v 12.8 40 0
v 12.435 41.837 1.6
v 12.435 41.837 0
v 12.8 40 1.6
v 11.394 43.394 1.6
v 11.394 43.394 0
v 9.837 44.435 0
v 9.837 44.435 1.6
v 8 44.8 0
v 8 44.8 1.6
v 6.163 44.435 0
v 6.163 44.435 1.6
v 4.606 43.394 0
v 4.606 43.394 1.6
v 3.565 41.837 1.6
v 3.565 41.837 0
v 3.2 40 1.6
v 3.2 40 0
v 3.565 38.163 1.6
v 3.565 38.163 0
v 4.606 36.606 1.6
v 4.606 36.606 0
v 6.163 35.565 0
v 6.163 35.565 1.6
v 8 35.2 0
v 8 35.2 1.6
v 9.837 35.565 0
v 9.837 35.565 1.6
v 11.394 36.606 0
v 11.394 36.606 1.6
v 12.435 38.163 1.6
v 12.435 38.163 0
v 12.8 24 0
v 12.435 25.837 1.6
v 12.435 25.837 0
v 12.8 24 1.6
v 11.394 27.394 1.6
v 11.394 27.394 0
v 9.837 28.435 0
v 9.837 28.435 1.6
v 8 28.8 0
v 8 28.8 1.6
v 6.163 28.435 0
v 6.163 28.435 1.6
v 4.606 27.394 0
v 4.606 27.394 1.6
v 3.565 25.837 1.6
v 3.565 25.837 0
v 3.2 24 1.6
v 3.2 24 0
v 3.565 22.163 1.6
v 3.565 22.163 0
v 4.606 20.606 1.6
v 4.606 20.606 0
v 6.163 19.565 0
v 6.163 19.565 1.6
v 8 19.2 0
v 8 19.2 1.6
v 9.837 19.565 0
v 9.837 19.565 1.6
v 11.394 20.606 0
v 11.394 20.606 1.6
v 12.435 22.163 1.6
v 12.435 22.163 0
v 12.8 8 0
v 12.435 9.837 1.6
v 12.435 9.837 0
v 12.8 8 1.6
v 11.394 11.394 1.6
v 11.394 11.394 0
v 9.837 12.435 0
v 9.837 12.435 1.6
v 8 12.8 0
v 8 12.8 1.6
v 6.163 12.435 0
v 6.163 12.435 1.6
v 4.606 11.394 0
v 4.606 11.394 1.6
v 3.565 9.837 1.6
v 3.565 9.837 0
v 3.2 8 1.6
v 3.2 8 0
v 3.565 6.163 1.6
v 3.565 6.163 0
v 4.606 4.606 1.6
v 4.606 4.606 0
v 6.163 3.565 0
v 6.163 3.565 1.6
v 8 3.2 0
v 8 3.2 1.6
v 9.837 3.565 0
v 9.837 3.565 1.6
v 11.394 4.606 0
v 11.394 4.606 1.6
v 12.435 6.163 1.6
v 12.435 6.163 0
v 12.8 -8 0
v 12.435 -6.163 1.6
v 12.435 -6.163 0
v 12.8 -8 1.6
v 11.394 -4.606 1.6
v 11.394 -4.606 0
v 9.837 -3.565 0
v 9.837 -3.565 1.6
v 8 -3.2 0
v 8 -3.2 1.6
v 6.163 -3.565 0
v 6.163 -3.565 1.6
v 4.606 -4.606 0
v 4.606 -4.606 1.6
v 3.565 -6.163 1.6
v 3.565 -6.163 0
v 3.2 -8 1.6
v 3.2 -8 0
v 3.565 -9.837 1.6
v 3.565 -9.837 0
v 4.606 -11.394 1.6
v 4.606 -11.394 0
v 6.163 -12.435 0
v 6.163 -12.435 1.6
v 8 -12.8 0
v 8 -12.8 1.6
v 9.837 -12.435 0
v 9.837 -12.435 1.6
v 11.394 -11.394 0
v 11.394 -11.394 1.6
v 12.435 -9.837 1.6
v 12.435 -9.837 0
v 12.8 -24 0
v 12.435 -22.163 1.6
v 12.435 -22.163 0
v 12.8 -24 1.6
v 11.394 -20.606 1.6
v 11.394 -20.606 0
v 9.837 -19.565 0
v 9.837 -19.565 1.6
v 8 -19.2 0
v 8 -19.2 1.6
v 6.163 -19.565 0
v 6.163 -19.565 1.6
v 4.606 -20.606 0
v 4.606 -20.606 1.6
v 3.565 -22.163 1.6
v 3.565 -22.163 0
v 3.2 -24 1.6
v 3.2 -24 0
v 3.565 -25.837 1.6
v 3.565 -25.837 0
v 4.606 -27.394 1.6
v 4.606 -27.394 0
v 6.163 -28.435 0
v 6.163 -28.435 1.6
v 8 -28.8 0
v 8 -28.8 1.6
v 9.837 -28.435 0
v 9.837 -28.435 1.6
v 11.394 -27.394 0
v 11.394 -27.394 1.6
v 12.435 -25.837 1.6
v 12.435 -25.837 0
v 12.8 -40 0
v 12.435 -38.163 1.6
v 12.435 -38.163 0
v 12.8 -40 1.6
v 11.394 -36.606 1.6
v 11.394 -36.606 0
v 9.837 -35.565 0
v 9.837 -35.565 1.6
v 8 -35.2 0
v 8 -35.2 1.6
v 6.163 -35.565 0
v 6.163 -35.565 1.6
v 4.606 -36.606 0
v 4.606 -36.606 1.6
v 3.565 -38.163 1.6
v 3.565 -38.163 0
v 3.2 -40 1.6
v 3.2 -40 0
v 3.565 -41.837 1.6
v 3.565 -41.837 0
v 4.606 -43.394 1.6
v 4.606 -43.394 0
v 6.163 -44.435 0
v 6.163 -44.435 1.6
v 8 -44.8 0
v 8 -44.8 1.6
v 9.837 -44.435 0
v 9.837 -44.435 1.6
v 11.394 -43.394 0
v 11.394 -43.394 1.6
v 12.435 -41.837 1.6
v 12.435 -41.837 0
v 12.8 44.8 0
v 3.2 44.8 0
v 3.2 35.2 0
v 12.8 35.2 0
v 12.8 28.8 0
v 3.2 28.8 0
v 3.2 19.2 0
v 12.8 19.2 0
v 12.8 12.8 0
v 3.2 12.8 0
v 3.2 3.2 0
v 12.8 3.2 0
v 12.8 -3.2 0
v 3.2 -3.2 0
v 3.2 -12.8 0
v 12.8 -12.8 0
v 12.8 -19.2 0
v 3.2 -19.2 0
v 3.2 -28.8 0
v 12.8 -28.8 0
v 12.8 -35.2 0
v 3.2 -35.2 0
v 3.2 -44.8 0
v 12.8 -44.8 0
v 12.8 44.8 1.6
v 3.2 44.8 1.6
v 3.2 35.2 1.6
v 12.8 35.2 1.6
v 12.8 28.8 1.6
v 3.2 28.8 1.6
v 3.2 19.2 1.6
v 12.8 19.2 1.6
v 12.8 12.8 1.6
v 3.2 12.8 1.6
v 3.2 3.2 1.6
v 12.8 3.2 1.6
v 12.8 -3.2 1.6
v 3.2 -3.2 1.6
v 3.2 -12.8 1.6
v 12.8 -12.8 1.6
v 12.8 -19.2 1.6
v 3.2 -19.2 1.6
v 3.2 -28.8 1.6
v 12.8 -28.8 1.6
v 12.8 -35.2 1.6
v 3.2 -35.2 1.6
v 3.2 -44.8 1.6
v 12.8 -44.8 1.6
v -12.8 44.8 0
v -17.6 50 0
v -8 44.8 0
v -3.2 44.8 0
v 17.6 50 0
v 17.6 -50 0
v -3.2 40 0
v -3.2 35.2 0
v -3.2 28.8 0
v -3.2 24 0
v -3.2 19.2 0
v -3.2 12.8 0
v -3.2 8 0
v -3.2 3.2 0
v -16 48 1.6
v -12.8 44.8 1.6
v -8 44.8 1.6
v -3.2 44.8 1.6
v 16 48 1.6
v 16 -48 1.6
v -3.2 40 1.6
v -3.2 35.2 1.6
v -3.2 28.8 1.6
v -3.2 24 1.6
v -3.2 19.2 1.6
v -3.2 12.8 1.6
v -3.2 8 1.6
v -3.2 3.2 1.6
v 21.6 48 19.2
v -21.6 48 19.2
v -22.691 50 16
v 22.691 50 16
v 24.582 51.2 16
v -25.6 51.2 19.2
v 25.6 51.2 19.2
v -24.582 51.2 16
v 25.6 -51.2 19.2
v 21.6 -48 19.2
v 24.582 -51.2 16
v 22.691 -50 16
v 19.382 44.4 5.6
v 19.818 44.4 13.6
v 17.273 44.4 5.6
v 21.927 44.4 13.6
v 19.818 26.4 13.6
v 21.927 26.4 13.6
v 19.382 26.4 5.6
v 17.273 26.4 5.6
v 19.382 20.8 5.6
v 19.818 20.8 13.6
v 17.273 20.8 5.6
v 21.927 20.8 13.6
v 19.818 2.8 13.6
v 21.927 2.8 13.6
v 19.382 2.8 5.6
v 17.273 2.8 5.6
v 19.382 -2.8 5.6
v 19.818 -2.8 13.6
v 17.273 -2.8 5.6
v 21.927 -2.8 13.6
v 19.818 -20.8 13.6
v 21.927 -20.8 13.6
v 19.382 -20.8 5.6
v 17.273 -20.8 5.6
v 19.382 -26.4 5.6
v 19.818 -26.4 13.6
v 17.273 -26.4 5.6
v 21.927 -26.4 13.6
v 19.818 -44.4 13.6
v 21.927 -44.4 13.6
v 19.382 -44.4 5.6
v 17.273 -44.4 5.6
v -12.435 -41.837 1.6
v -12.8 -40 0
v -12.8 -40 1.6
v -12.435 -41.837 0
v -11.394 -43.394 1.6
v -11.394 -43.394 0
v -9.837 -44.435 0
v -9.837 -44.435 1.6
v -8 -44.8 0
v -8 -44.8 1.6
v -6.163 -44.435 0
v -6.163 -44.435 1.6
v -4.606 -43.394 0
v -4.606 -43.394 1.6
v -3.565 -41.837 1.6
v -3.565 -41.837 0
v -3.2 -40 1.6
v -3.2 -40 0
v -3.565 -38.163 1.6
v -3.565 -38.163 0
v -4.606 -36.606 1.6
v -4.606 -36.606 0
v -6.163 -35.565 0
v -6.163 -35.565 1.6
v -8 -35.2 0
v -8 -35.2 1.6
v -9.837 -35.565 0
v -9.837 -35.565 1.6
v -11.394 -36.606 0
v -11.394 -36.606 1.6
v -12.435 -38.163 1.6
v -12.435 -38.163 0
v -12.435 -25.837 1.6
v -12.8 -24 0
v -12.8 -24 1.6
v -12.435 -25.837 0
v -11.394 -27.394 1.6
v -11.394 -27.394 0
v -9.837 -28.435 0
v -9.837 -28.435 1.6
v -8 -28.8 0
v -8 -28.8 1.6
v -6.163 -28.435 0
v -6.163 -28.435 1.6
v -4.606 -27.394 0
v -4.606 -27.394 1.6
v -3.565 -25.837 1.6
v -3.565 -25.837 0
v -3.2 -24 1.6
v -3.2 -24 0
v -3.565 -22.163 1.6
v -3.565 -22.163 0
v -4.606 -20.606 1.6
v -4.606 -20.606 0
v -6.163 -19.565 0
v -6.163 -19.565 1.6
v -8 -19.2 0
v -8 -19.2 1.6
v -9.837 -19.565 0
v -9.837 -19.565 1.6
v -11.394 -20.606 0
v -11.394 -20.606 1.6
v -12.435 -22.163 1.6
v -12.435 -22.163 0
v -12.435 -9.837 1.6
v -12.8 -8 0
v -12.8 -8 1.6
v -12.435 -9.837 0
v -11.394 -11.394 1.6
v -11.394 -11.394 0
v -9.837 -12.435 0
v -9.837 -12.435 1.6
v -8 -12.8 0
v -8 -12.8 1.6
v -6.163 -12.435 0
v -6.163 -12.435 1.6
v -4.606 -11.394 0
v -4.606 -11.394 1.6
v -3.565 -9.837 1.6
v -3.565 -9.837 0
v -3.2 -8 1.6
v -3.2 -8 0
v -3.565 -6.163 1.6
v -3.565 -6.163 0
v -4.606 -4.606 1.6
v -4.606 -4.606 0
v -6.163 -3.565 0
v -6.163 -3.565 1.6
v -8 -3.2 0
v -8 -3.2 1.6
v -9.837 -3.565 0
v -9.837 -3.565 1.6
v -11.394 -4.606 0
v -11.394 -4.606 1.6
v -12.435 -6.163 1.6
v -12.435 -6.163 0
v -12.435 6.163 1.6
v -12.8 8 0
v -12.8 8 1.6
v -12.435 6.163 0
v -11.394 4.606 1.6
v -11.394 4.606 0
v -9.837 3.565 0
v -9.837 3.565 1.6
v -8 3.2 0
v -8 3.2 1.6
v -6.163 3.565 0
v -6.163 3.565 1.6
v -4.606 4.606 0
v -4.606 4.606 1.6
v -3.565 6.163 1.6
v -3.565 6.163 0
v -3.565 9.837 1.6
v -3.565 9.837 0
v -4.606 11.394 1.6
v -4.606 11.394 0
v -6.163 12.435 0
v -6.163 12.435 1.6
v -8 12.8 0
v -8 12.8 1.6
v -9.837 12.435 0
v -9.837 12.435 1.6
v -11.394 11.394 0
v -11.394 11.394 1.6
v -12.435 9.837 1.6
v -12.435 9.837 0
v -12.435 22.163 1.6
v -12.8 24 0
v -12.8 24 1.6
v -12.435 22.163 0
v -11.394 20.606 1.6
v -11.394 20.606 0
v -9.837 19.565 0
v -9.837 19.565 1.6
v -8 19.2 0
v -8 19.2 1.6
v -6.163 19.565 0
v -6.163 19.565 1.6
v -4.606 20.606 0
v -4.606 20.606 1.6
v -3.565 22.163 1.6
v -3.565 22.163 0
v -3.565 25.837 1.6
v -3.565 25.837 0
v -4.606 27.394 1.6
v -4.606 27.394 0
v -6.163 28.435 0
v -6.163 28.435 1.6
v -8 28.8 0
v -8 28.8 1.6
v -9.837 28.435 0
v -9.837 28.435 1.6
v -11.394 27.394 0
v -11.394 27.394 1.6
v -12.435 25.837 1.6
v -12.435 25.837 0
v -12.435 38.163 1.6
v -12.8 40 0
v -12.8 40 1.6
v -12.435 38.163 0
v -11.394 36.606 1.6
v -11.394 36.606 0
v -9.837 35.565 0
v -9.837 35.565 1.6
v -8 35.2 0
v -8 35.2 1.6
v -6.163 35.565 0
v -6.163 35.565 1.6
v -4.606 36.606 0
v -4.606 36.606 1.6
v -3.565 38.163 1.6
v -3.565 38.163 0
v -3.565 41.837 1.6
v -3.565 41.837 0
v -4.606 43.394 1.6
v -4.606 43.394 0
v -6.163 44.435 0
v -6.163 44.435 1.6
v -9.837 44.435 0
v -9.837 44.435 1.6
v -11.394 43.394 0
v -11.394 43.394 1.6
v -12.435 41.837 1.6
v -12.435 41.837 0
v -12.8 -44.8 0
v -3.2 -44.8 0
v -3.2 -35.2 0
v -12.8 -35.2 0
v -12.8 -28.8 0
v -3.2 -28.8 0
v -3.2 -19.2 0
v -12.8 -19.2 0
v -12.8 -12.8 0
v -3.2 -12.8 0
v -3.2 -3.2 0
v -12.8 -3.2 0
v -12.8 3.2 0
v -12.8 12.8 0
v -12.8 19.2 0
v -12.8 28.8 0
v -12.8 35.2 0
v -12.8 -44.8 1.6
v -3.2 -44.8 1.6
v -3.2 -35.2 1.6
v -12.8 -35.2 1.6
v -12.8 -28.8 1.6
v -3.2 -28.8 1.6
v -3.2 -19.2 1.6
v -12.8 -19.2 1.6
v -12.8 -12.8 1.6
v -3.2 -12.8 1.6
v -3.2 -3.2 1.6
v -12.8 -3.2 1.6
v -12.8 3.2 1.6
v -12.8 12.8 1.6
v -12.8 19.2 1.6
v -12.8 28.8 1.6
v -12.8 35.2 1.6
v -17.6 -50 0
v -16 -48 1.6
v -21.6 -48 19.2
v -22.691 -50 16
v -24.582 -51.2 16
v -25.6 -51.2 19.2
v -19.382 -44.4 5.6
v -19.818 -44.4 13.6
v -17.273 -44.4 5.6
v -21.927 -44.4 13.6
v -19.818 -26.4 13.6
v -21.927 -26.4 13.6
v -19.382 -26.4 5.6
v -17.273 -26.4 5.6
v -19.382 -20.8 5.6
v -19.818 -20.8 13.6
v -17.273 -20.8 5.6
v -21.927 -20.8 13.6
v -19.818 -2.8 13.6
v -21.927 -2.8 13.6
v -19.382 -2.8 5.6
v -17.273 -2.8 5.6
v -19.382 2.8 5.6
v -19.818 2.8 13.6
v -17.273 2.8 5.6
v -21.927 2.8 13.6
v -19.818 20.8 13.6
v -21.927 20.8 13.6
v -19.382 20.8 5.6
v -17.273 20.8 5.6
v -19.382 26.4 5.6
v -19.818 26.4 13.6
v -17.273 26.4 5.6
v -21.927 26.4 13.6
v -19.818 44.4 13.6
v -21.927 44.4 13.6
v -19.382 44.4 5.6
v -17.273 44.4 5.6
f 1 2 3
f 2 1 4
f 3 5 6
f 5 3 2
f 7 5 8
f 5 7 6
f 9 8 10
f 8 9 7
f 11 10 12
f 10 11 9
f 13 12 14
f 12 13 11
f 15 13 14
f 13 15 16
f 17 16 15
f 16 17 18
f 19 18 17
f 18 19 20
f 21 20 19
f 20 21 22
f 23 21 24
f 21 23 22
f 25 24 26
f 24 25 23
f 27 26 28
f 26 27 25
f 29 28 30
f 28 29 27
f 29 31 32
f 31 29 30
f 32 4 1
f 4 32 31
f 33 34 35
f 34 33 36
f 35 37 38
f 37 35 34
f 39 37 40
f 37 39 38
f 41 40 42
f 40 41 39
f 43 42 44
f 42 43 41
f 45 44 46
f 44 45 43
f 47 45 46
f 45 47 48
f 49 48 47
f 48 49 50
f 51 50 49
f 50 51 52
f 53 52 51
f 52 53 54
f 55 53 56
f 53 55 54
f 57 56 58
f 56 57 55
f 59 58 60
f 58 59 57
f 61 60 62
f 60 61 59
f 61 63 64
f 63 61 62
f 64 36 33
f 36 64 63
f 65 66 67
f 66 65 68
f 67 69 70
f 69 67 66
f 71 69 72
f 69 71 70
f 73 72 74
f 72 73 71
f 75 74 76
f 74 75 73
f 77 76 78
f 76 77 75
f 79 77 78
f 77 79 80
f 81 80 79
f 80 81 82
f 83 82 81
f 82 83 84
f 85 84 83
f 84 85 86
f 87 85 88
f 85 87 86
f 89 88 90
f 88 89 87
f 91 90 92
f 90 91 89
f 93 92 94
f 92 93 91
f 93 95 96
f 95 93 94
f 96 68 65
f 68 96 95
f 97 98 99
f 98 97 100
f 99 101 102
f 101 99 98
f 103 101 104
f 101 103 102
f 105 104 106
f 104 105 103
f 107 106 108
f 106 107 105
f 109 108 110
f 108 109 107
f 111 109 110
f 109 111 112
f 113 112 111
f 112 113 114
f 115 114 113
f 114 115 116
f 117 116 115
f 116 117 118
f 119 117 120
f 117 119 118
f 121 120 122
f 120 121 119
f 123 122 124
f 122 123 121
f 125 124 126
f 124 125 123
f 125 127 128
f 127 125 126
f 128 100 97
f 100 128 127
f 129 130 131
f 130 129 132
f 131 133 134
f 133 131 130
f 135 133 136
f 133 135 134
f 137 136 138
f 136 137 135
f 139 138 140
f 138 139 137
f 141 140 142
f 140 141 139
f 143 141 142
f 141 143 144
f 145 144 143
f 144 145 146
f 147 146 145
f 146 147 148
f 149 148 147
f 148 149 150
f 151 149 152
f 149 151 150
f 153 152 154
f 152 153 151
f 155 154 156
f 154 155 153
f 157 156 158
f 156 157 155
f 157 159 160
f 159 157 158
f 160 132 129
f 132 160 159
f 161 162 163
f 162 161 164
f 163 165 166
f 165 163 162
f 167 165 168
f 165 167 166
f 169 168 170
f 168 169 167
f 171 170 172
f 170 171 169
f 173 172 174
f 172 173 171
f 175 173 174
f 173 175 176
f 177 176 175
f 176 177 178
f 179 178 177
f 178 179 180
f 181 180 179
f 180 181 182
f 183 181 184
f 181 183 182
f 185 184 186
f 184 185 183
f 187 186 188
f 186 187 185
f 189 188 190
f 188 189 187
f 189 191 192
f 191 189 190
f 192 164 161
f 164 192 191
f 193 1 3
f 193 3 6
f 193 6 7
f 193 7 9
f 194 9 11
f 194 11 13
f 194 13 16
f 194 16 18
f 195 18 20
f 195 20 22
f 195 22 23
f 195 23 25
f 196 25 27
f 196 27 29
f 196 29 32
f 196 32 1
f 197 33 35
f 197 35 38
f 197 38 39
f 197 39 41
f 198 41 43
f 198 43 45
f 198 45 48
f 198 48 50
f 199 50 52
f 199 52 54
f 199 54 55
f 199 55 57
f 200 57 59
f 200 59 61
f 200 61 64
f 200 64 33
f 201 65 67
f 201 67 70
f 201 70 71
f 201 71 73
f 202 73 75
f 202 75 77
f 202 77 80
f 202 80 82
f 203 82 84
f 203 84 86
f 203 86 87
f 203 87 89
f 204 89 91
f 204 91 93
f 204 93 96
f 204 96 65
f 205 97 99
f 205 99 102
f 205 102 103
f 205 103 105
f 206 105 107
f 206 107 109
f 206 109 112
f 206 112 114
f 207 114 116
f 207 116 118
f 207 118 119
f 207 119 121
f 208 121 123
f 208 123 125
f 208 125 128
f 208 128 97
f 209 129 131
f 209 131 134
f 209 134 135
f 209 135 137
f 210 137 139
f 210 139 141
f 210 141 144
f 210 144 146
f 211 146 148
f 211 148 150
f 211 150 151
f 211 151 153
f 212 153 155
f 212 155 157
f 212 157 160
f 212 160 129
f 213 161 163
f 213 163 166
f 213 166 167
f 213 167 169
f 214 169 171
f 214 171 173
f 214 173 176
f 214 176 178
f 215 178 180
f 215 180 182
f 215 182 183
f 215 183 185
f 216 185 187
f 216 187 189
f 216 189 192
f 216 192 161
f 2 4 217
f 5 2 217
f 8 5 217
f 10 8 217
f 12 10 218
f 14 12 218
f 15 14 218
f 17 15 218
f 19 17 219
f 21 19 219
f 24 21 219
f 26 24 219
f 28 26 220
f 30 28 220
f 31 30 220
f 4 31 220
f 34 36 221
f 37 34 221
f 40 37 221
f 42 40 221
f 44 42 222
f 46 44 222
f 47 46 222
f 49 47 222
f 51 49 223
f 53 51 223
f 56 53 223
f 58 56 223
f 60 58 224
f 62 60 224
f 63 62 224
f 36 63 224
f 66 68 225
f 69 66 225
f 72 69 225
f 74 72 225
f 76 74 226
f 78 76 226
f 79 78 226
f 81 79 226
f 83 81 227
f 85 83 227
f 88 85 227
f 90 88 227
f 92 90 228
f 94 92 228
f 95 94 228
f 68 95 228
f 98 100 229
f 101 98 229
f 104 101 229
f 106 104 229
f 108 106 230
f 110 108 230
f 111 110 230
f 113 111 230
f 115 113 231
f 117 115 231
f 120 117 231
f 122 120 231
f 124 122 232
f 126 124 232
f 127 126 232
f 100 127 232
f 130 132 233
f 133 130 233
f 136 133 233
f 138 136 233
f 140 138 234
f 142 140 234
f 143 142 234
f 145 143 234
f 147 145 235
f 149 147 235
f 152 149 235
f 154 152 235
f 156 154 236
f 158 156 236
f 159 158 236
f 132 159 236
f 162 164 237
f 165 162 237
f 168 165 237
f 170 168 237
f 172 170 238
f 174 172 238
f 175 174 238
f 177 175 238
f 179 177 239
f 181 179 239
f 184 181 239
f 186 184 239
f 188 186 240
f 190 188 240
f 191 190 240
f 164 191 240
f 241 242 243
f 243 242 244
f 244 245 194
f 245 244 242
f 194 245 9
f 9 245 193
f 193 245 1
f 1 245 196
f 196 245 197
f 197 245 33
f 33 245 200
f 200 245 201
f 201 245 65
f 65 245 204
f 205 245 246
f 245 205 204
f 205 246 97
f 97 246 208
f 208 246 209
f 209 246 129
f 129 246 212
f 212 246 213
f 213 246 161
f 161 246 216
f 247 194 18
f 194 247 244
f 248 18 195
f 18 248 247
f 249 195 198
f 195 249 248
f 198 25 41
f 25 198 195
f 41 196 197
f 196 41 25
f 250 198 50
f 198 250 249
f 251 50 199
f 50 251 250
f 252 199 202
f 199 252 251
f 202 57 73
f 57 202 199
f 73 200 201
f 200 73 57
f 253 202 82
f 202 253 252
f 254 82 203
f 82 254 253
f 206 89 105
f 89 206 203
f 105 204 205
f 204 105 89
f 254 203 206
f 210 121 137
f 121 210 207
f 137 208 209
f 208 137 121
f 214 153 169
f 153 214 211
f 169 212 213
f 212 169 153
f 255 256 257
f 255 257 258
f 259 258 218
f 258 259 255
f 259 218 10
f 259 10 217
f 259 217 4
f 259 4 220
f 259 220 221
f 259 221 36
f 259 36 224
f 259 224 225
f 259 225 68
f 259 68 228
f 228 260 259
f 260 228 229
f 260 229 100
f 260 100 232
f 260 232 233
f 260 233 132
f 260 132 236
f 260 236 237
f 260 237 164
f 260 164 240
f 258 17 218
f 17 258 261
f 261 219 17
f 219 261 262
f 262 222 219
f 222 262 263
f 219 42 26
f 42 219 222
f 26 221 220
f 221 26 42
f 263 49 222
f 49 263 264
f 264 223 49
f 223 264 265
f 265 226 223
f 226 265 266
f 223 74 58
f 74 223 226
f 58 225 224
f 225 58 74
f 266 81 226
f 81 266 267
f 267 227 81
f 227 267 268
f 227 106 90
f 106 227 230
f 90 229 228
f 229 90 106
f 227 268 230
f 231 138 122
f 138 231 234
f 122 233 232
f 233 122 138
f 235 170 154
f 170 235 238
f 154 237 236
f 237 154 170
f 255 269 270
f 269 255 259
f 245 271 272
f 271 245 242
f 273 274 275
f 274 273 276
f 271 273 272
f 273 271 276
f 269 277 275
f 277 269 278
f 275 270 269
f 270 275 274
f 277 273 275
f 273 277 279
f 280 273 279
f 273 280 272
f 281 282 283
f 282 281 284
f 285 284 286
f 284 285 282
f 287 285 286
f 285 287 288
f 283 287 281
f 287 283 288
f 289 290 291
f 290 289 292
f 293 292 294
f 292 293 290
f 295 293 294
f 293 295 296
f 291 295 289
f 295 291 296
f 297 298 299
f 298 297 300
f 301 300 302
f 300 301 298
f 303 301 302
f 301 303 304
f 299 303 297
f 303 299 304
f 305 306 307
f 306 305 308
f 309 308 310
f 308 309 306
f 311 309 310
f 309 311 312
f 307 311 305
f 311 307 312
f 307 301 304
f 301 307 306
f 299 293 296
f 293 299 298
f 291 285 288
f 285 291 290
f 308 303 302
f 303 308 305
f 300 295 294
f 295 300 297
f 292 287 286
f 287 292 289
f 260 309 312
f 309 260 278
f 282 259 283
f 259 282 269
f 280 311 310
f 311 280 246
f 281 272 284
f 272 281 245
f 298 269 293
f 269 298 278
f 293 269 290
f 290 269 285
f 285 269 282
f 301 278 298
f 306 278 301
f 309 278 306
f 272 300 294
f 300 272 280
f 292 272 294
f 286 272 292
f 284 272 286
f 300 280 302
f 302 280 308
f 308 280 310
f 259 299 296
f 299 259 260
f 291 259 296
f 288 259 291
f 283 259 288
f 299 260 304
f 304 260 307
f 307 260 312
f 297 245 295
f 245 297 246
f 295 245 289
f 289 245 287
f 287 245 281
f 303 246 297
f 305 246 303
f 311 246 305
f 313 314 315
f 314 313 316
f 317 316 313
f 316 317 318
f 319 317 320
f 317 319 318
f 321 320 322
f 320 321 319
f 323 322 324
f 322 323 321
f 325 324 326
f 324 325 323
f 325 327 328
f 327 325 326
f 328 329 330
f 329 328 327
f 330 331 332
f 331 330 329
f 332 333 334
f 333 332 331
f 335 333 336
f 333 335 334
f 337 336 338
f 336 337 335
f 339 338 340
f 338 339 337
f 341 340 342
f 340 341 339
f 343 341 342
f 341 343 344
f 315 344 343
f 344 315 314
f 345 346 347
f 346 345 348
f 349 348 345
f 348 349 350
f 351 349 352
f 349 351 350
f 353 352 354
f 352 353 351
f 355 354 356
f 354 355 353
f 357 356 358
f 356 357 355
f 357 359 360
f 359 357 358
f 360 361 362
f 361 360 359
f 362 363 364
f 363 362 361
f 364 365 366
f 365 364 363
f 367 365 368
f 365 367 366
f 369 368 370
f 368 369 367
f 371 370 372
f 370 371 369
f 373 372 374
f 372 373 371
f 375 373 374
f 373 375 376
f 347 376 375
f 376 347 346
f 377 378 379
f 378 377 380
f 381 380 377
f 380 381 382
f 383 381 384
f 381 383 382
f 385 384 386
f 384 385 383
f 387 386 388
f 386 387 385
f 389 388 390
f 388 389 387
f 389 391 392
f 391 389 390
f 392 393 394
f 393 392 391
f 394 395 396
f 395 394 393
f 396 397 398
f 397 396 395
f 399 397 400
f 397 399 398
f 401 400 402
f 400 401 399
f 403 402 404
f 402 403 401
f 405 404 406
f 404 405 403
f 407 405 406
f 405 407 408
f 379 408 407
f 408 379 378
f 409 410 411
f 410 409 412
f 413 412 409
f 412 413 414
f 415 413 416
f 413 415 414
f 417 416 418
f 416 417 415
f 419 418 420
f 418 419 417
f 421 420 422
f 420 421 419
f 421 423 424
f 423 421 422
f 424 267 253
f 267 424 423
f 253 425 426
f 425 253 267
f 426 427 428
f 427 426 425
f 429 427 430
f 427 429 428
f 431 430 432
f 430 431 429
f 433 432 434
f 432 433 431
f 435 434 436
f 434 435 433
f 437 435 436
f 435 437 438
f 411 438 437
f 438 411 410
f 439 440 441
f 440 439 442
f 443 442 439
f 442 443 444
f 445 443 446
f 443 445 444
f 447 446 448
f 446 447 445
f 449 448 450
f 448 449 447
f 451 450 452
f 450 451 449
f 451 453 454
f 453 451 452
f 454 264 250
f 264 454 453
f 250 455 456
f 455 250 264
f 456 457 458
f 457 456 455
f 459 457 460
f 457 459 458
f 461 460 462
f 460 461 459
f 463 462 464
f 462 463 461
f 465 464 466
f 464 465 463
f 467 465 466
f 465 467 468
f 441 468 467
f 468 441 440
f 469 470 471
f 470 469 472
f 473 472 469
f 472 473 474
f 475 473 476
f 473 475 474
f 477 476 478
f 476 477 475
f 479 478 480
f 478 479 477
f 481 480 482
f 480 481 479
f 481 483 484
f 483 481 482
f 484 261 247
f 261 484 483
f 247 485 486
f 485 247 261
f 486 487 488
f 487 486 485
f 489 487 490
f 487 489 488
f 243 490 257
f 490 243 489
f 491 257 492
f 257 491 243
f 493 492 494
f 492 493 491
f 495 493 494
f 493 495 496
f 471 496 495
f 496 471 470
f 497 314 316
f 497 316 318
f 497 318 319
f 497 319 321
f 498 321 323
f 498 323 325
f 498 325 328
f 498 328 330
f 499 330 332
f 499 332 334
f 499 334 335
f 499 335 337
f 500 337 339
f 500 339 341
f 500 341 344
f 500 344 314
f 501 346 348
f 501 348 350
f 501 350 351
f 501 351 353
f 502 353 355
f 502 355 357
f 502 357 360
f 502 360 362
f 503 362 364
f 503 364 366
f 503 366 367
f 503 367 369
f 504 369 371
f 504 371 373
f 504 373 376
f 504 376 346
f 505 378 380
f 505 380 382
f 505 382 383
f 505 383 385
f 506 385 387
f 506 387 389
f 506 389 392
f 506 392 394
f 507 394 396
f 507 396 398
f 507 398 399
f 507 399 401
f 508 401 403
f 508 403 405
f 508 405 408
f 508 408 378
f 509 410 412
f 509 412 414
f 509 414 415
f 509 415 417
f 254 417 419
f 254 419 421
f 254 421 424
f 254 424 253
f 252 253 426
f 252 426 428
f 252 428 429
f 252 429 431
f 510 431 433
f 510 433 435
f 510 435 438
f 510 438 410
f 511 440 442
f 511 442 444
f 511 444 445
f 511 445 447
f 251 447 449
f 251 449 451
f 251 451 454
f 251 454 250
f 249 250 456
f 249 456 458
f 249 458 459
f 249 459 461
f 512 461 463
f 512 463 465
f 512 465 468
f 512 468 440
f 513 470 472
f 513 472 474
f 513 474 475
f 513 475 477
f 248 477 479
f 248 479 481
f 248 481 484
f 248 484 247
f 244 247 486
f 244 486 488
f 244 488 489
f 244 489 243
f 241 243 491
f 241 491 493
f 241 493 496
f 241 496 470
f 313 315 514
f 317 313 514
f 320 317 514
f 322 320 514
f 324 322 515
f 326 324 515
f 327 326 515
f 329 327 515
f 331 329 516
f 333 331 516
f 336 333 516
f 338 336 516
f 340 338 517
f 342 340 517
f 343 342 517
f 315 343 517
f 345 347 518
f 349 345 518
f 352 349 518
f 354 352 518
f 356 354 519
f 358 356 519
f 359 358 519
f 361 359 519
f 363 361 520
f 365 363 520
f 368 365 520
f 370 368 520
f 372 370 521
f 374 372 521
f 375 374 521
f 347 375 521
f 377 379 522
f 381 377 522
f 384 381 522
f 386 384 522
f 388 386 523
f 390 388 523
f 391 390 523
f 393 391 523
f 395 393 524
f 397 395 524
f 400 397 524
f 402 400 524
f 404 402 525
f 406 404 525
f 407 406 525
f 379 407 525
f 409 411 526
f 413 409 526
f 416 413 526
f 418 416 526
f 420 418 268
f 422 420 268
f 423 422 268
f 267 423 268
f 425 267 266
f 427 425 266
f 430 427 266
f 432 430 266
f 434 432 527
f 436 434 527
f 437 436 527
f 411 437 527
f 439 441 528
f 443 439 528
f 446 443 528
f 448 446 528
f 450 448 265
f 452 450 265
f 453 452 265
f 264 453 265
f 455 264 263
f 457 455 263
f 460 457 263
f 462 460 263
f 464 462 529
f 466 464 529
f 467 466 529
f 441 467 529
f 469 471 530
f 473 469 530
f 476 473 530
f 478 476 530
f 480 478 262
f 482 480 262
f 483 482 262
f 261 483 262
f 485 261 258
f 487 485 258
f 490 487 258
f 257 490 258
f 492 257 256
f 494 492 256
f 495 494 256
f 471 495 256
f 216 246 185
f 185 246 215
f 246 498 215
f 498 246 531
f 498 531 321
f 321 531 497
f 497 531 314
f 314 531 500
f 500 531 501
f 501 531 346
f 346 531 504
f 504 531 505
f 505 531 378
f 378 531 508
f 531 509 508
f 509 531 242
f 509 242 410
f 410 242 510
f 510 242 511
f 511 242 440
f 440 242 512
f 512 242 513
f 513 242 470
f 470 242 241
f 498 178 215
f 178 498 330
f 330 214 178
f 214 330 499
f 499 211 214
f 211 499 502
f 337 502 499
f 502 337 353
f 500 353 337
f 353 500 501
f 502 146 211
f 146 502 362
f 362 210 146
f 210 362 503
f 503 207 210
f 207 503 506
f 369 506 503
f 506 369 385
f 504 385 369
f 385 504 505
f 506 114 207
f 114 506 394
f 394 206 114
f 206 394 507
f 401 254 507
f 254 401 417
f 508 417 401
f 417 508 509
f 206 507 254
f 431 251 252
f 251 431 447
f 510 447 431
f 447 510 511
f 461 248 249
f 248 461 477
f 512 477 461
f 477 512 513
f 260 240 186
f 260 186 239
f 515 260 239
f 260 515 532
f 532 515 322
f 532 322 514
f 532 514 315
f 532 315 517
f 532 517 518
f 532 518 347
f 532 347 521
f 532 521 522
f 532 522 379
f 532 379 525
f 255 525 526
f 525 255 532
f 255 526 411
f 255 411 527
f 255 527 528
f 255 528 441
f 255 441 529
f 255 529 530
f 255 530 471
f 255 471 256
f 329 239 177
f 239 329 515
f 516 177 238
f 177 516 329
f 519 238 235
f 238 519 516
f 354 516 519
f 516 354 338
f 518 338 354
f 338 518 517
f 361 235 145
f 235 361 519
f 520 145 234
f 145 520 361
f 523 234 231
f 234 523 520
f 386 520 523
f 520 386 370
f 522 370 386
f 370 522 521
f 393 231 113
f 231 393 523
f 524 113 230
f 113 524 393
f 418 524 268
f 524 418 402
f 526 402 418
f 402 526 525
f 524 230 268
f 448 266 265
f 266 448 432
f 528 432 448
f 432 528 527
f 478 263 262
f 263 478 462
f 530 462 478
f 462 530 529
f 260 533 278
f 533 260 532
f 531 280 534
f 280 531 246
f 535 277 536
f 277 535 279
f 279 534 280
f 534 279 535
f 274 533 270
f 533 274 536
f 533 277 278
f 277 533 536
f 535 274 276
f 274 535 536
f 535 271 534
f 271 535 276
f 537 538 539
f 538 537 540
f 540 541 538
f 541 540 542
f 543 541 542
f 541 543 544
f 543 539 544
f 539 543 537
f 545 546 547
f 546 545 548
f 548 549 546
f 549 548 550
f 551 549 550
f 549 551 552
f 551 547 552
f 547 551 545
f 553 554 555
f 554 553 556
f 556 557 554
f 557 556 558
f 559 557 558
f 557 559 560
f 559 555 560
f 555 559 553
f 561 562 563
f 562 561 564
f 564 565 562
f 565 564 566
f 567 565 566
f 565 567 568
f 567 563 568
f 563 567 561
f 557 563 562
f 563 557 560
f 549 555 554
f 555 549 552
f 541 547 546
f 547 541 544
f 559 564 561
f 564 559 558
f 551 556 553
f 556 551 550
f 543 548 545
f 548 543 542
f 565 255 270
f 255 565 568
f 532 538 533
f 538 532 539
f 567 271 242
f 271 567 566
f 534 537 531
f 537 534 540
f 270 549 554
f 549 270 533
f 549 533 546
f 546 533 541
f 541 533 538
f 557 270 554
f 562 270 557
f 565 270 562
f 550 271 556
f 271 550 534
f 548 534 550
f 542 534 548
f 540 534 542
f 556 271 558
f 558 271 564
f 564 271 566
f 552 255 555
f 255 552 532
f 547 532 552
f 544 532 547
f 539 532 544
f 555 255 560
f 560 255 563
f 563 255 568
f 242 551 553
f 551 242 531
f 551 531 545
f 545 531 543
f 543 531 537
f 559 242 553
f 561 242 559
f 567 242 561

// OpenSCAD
// file: ../p/4-4edge.scad
use <../lib.scad>
function ldraw_lib__4_4edge() = [
// 0 Circle 1.0
// 0 Name: 4-4edge.dat
// 0 Author: James Jessiman
// 0 !LDRAW_ORG Primitive UPDATE 2017-01
// 0 !LICENSE Licensed under CC BY 4.0 : see CAreadme.txt
// 
// 0 BFC CERTIFY CCW
  [0,"BFC","CERTIFY"],
  [0,"BFC","CCW"],
// 
// 0 !HISTORY 1998-12-15 [PTadmin] Official Update 1998-10
// 0 !HISTORY 2005-12-28 [PTadmin] Official Update 2005-01
// 0 !HISTORY 2007-06-24 [PTadmin] Header formatted for Contributor Agreement
// 0 !HISTORY 2008-07-01 [PTadmin] Official Update 2008-01
// 0 !HISTORY 2017-01-15 [Steffen] BFCed
// 0 !HISTORY 2017-12-30 [PTadmin] Official Update 2017-01
// 
// 
// 2 24 1 0 0 0.9239 0 0.3827
  [2,24,1,0,0,0.9239,0,0.3827],
// 2 24 0.9239 0 0.3827 0.7071 0 0.7071
  [2,24,0.9239,0,0.3827,0.7071,0,0.7071],
// 2 24 0.7071 0 0.7071 0.3827 0 0.9239
  [2,24,0.7071,0,0.7071,0.3827,0,0.9239],
// 2 24 0.3827 0 0.9239 0 0 1
  [2,24,0.3827,0,0.9239,0,0,1],
// 2 24 0 0 1 -0.3827 0 0.9239
  [2,24,0,0,1,-0.3827,0,0.9239],
// 2 24 -0.3827 0 0.9239 -0.7071 0 0.7071
  [2,24,-0.3827,0,0.9239,-0.7071,0,0.7071],
// 2 24 -0.7071 0 0.7071 -0.9239 0 0.3827
  [2,24,-0.7071,0,0.7071,-0.9239,0,0.3827],
// 2 24 -0.9239 0 0.3827 -1 0 -0
  [2,24,-0.9239,0,0.3827,-1,0,-0],
// 2 24 -1 0 -0 -0.9239 0 -0.3827
  [2,24,-1,0,-0,-0.9239,0,-0.3827],
// 2 24 -0.9239 0 -0.3827 -0.7071 0 -0.7071
  [2,24,-0.9239,0,-0.3827,-0.7071,0,-0.7071],
// 2 24 -0.7071 0 -0.7071 -0.3827 0 -0.9239
  [2,24,-0.7071,0,-0.7071,-0.3827,0,-0.9239],
// 2 24 -0.3827 0 -0.9239 0 0 -1
  [2,24,-0.3827,0,-0.9239,0,0,-1],
// 2 24 0 0 -1 0.3827 0 -0.9239
  [2,24,0,0,-1,0.3827,0,-0.9239],
// 2 24 0.3827 0 -0.9239 0.7071 0 -0.7071
  [2,24,0.3827,0,-0.9239,0.7071,0,-0.7071],
// 2 24 0.7071 0 -0.7071 0.9239 0 -0.3827
  [2,24,0.7071,0,-0.7071,0.9239,0,-0.3827],
// 2 24 0.9239 0 -0.3827 1 0 0
  [2,24,0.9239,0,-0.3827,1,0,0],
];
module ldraw_lib__4_4edge(step=0, col=false, unit=2/5, alt=false, line=0.2, solid=!$preview)
    makepoly(ldraw_lib__4_4edge(), step=step, col=col, unit=unit, alt=alt, line=line, solid=solid);
ldraw_lib__4_4edge(line=0.2);
// file: ../p/4-4cyli.scad
use <../lib.scad>
function ldraw_lib__4_4cyli() = [
// 0 Cylinder 1.0
// 0 Name: 4-4cyli.dat
// 0 Author: James Jessiman
// 0 !LDRAW_ORG Primitive UPDATE 2005-01
// 0 !LICENSE Licensed under CC BY 4.0 : see CAreadme.txt
// 
// 0 BFC CERTIFY CCW
  [0,"BFC","CERTIFY"],
  [0,"BFC","CCW"],
// 
// 0 !HISTORY 1998-12-15 [PTadmin] Official Update 1998-10
// 0 !HISTORY 2002-03-23 [sbliss] Added BFC statement; merged headers from files in distributions LDraw 0.27 and Complete.
// 0 !HISTORY 2002-04-25 [PTadmin] Official Update 2002-02
// 0 !HISTORY 2004-12-14 [guyvivan] BFC CCW
// 0 !HISTORY 2005-12-28 [PTadmin] Official Update 2005-01
// 0 !HISTORY 2007-06-24 [PTadmin] Header formatted for Contributor Agreement
// 0 !HISTORY 2008-07-01 [PTadmin] Official Update 2008-01
// 
// 
// 4 16 1 1 0 0.9239 1 0.3827 0.9239 0 0.3827 1 0 0
  [4,16,1,1,0,0.9239,1,0.3827,0.9239,0,0.3827,1,0,0],
// 5 24 1 0 0 1 1 0 0.9239 0 0.3827 0.9239 0 -0.3827
  [5,24,1,0,0,1,1,0,0.9239,0,0.3827,0.9239,0,-0.3827],
// 4 16 0.9239 1 0.3827 0.7071 1 0.7071 0.7071 0 0.7071 0.9239 0 0.3827
  [4,16,0.9239,1,0.3827,0.7071,1,0.7071,0.7071,0,0.7071,0.9239,0,0.3827],
// 5 24 0.9239 0 0.3827 0.9239 1 0.3827 0.7071 0 0.7071 1 0 0
  [5,24,0.9239,0,0.3827,0.9239,1,0.3827,0.7071,0,0.7071,1,0,0],
// 4 16 0.7071 1 0.7071 0.3827 1 0.9239 0.3827 0 0.9239 0.7071 0 0.7071
  [4,16,0.7071,1,0.7071,0.3827,1,0.9239,0.3827,0,0.9239,0.7071,0,0.7071],
// 5 24 0.7071 0 0.7071 0.7071 1 0.7071 0.3827 0 0.9239 0.9239 0 0.3827
  [5,24,0.7071,0,0.7071,0.7071,1,0.7071,0.3827,0,0.9239,0.9239,0,0.3827],
// 4 16 0.3827 1 0.9239 0 1 1 0 0 1 0.3827 0 0.9239
  [4,16,0.3827,1,0.9239,0,1,1,0,0,1,0.3827,0,0.9239],
// 5 24 0.3827 0 0.9239 0.3827 1 0.9239 0 0 1 0.7071 0 0.7071
  [5,24,0.3827,0,0.9239,0.3827,1,0.9239,0,0,1,0.7071,0,0.7071],
// 4 16 0 1 1 -0.3827 1 0.9239 -0.3827 0 0.9239 0 0 1
  [4,16,0,1,1,-0.3827,1,0.9239,-0.3827,0,0.9239,0,0,1],
// 5 24 0 0 1 0 1 1 -0.3827 0 0.9239 0.3827 0 0.9239
  [5,24,0,0,1,0,1,1,-0.3827,0,0.9239,0.3827,0,0.9239],
// 4 16 -0.3827 1 0.9239 -0.7071 1 0.7071 -0.7071 0 0.7071 -0.3827 0 0.9239
  [4,16,-0.3827,1,0.9239,-0.7071,1,0.7071,-0.7071,0,0.7071,-0.3827,0,0.9239],
// 5 24 -0.3827 0 0.9239 -0.3827 1 0.9239 -0.7071 0 0.7071 0 0 1
  [5,24,-0.3827,0,0.9239,-0.3827,1,0.9239,-0.7071,0,0.7071,0,0,1],
// 4 16 -0.7071 1 0.7071 -0.9239 1 0.3827 -0.9239 0 0.3827 -0.7071 0 0.7071
  [4,16,-0.7071,1,0.7071,-0.9239,1,0.3827,-0.9239,0,0.3827,-0.7071,0,0.7071],
// 5 24 -0.7071 0 0.7071 -0.7071 1 0.7071 -0.9239 0 0.3827 -0.3827 0 0.9239
  [5,24,-0.7071,0,0.7071,-0.7071,1,0.7071,-0.9239,0,0.3827,-0.3827,0,0.9239],
// 4 16 -0.9239 1 0.3827 -1 1 0 -1 0 0 -0.9239 0 0.3827
  [4,16,-0.9239,1,0.3827,-1,1,0,-1,0,0,-0.9239,0,0.3827],
// 5 24 -0.9239 0 0.3827 -0.9239 1 0.3827 -1 0 0 -0.7071 0 0.7071
  [5,24,-0.9239,0,0.3827,-0.9239,1,0.3827,-1,0,0,-0.7071,0,0.7071],
// 4 16 -1 1 0 -0.9239 1 -0.3827 -0.9239 0 -0.3827 -1 0 0
  [4,16,-1,1,0,-0.9239,1,-0.3827,-0.9239,0,-0.3827,-1,0,0],
// 5 24 -1 0 0 -1 1 0 -0.9239 0 -0.3827 -0.9239 0 0.3827
  [5,24,-1,0,0,-1,1,0,-0.9239,0,-0.3827,-0.9239,0,0.3827],
// 4 16 -0.9239 1 -0.3827 -0.7071 1 -0.7071 -0.7071 0 -0.7071 -0.9239 0 -0.3827
  [4,16,-0.9239,1,-0.3827,-0.7071,1,-0.7071,-0.7071,0,-0.7071,-0.9239,0,-0.3827],
// 5 24 -0.9239 0 -0.3827 -0.9239 1 -0.3827 -0.7071 0 -0.7071 -1 0 0
  [5,24,-0.9239,0,-0.3827,-0.9239,1,-0.3827,-0.7071,0,-0.7071,-1,0,0],
// 4 16 -0.7071 1 -0.7071 -0.3827 1 -0.9239 -0.3827 0 -0.9239 -0.7071 0 -0.7071
  [4,16,-0.7071,1,-0.7071,-0.3827,1,-0.9239,-0.3827,0,-0.9239,-0.7071,0,-0.7071],
// 5 24 -0.7071 0 -0.7071 -0.7071 1 -0.7071 -0.3827 0 -0.9239 -0.9239 0 -0.3827
  [5,24,-0.7071,0,-0.7071,-0.7071,1,-0.7071,-0.3827,0,-0.9239,-0.9239,0,-0.3827],
// 4 16 -0.3827 1 -0.9239 0 1 -1 0 0 -1 -0.3827 0 -0.9239
  [4,16,-0.3827,1,-0.9239,0,1,-1,0,0,-1,-0.3827,0,-0.9239],
// 5 24 -0.3827 0 -0.9239 -0.3827 1 -0.9239 0 0 -1 -0.7071 0 -0.7071
  [5,24,-0.3827,0,-0.9239,-0.3827,1,-0.9239,0,0,-1,-0.7071,0,-0.7071],
// 4 16 0 1 -1 0.3827 1 -0.9239 0.3827 0 -0.9239 0 0 -1
  [4,16,0,1,-1,0.3827,1,-0.9239,0.3827,0,-0.9239,0,0,-1],
// 5 24 0 0 -1 0 1 -1 0.3827 0 -0.9239 -0.3827 0 -0.9239
  [5,24,0,0,-1,0,1,-1,0.3827,0,-0.9239,-0.3827,0,-0.9239],
// 4 16 0.3827 1 -0.9239 0.7071 1 -0.7071 0.7071 0 -0.7071 0.3827 0 -0.9239
  [4,16,0.3827,1,-0.9239,0.7071,1,-0.7071,0.7071,0,-0.7071,0.3827,0,-0.9239],
// 5 24 0.3827 0 -0.9239 0.3827 1 -0.9239 0.7071 0 -0.7071 0 0 -1
  [5,24,0.3827,0,-0.9239,0.3827,1,-0.9239,0.7071,0,-0.7071,0,0,-1],
// 4 16 0.7071 1 -0.7071 0.9239 1 -0.3827 0.9239 0 -0.3827 0.7071 0 -0.7071
  [4,16,0.7071,1,-0.7071,0.9239,1,-0.3827,0.9239,0,-0.3827,0.7071,0,-0.7071],
// 5 24 0.7071 0 -0.7071 0.7071 1 -0.7071 0.9239 0 -0.3827 0.3827 0 -0.9239
  [5,24,0.7071,0,-0.7071,0.7071,1,-0.7071,0.9239,0,-0.3827,0.3827,0,-0.9239],
// 4 16 0.9239 1 -0.3827 1 1 0 1 0 0 0.9239 0 -0.3827
  [4,16,0.9239,1,-0.3827,1,1,0,1,0,0,0.9239,0,-0.3827],
// 5 24 0.9239 0 -0.3827 0.9239 1 -0.3827 1 0 0 0.7071 0 -0.7071
  [5,24,0.9239,0,-0.3827,0.9239,1,-0.3827,1,0,0,0.7071,0,-0.7071],
// 0
];
module ldraw_lib__4_4cyli(step=0, col=false, unit=2/5, alt=false, line=0.2, solid=!$preview)
    makepoly(ldraw_lib__4_4cyli(), step=step, col=col, unit=unit, alt=alt, line=line, solid=solid);
ldraw_lib__4_4cyli(line=0.2);
// file: ../p/box4.scad
use <../lib.scad>
function ldraw_lib__box4() = [
// 0 Box with 4 Faces (2 Parallel Pairs) and All Edges
// 0 Name: box4.dat
// 0 Author: James Jessiman
// 0 !LDRAW_ORG Primitive UPDATE 2012-01
// 0 !LICENSE Licensed under CC BY 4.0 : see CAreadme.txt
// 
// 0 BFC CERTIFY CCW
  [0,"BFC","CERTIFY"],
  [0,"BFC","CCW"],
// 
// 0 !HISTORY 2002-04-03 [sbliss] Modified for BFC compliance
// 0 !HISTORY 2002-04-25 [PTadmin] Official Update 2002-02
// 0 !HISTORY 2007-06-24 [PTadmin] Header formatted for Contributor Agreement
// 0 !HISTORY 2008-07-01 [PTadmin] Official Update 2008-01
// 0 !HISTORY 2012-02-16 [Philo] Changed to CCW
// 0 !HISTORY 2012-03-30 [PTadmin] Official Update 2012-01
// 
// 
// 2 24 1 1 1 -1 1 1
  [2,24,1,1,1,-1,1,1],
// 2 24 -1 1 1 -1 1 -1
  [2,24,-1,1,1,-1,1,-1],
// 2 24 -1 1 -1 1 1 -1
  [2,24,-1,1,-1,1,1,-1],
// 2 24 1 1 -1 1 1 1
  [2,24,1,1,-1,1,1,1],
// 2 24 1 0 1 -1 0 1
  [2,24,1,0,1,-1,0,1],
// 2 24 -1 0 1 -1 0 -1
  [2,24,-1,0,1,-1,0,-1],
// 2 24 -1 0 -1 1 0 -1
  [2,24,-1,0,-1,1,0,-1],
// 2 24 1 0 -1 1 0 1
  [2,24,1,0,-1,1,0,1],
// 2 24 1 0 1 1 1 1
  [2,24,1,0,1,1,1,1],
// 2 24 -1 0 1 -1 1 1
  [2,24,-1,0,1,-1,1,1],
// 2 24 1 0 -1 1 1 -1
  [2,24,1,0,-1,1,1,-1],
// 2 24 -1 0 -1 -1 1 -1
  [2,24,-1,0,-1,-1,1,-1],
// 4 16 -1 1 1 -1 0 1 1 0 1 1 1 1
  [4,16,-1,1,1,-1,0,1,1,0,1,1,1,1],
// 4 16 -1 1 -1 -1 0 -1 -1 0 1 -1 1 1
  [4,16,-1,1,-1,-1,0,-1,-1,0,1,-1,1,1],
// 4 16 1 1 -1 1 0 -1 -1 0 -1 -1 1 -1
  [4,16,1,1,-1,1,0,-1,-1,0,-1,-1,1,-1],
// 4 16 1 1 1 1 0 1 1 0 -1 1 1 -1
  [4,16,1,1,1,1,0,1,1,0,-1,1,1,-1],
];
module ldraw_lib__box4(step=0, col=false, unit=2/5, alt=false, line=0.2, solid=!$preview)
    makepoly(ldraw_lib__box4(), step=step, col=col, unit=unit, alt=alt, line=line, solid=solid);
ldraw_lib__box4(line=0.2);
// file: ../p/4-4ndis.scad
use <../lib.scad>
function ldraw_lib__4_4ndis() = [
// 0 Disc Negative 1.0
// 0 Name: 4-4ndis.dat
// 0 Author: James Jessiman
// 0 !LDRAW_ORG Primitive UPDATE 2012-01
// 0 !LICENSE Licensed under CC BY 4.0 : see CAreadme.txt
// 
// 0 BFC CERTIFY CCW
  [0,"BFC","CERTIFY"],
  [0,"BFC","CCW"],
// 
// 0 !HISTORY 2002-03-23 [sbliss] Added BFC statement; compacted code
// 0 !HISTORY 2002-04-25 [PTadmin] Official Update 2002-02
// 0 !HISTORY 2007-06-24 [PTadmin] Header formatted for Contributor Agreement
// 0 !HISTORY 2008-07-01 [PTadmin] Official Update 2008-01
// 0 !HISTORY 2012-02-16 [Philo] Changed to CCW
// 0 !HISTORY 2012-03-30 [PTadmin] Official Update 2012-01
// 
// 
// 3 16 0.9239 0 0.3827 1 0 0 1 0 1
  [3,16,0.9239,0,0.3827,1,0,0,1,0,1],
// 3 16 0.7071 0 0.7071 0.9239 0 0.3827 1 0 1
  [3,16,0.7071,0,0.7071,0.9239,0,0.3827,1,0,1],
// 3 16 0.3827 0 0.9239 0.7071 0 0.7071 1 0 1
  [3,16,0.3827,0,0.9239,0.7071,0,0.7071,1,0,1],
// 3 16 0 0 1 0.3827 0 0.9239 1 0 1
  [3,16,0,0,1,0.3827,0,0.9239,1,0,1],
// 3 16 -0.3827 0 0.9239 0 0 1 -1 0 1
  [3,16,-0.3827,0,0.9239,0,0,1,-1,0,1],
// 3 16 -0.7071 0 0.7071 -0.3827 0 0.9239 -1 0 1
  [3,16,-0.7071,0,0.7071,-0.3827,0,0.9239,-1,0,1],
// 3 16 -0.9239 0 0.3827 -0.7071 0 0.7071 -1 0 1
  [3,16,-0.9239,0,0.3827,-0.7071,0,0.7071,-1,0,1],
// 3 16 -1 0 0 -0.9239 0 0.3827 -1 0 1
  [3,16,-1,0,0,-0.9239,0,0.3827,-1,0,1],
// 3 16 -0.9239 0 -0.3827 -1 0 0 -1 0 -1
  [3,16,-0.9239,0,-0.3827,-1,0,0,-1,0,-1],
// 3 16 -0.7071 0 -0.7071 -0.9239 0 -0.3827 -1 0 -1
  [3,16,-0.7071,0,-0.7071,-0.9239,0,-0.3827,-1,0,-1],
// 3 16 -0.3827 0 -0.9239 -0.7071 0 -0.7071 -1 0 -1
  [3,16,-0.3827,0,-0.9239,-0.7071,0,-0.7071,-1,0,-1],
// 3 16 0 0 -1 -0.3827 0 -0.9239 -1 0 -1
  [3,16,0,0,-1,-0.3827,0,-0.9239,-1,0,-1],
// 3 16 0.3827 0 -0.9239 0 0 -1 1 0 -1
  [3,16,0.3827,0,-0.9239,0,0,-1,1,0,-1],
// 3 16 0.7071 0 -0.7071 0.3827 0 -0.9239 1 0 -1
  [3,16,0.7071,0,-0.7071,0.3827,0,-0.9239,1,0,-1],
// 3 16 0.9239 0 -0.3827 0.7071 0 -0.7071 1 0 -1
  [3,16,0.9239,0,-0.3827,0.7071,0,-0.7071,1,0,-1],
// 3 16 1 0 0 0.9239 0 -0.3827 1 0 -1
  [3,16,1,0,0,0.9239,0,-0.3827,1,0,-1],
];
module ldraw_lib__4_4ndis(step=0, col=false, unit=2/5, alt=false, line=0.2, solid=!$preview)
    makepoly(ldraw_lib__4_4ndis(), step=step, col=col, unit=unit, alt=alt, line=line, solid=solid);
ldraw_lib__4_4ndis(line=0.2);
// file: ../p/4-4cylo.scad
use <../lib.scad>
use <4-4cyli.scad>
use <4-4edge.scad>
function ldraw_lib__4_4cylo() = [
// 0 Cylinder Open 1.0
// 0 Name: 4-4cylo.dat
// 0 Author: Mark Kennedy [mkennedy]
// 0 !LDRAW_ORG Primitive UPDATE 2010-01
// 0 !LICENSE Licensed under CC BY 4.0 : see CAreadme.txt
// 
// 0 BFC CERTIFY CCW
  [0,"BFC","CERTIFY"],
  [0,"BFC","CCW"],
// 
// 0 !HISTORY 2010-04-05 [PTadmin] Official Update 2010-01
// 
// 
// 1 16 0 0 0 1 0 0 0 1 0 0 0 1 4-4edge.dat
  [1,16,0,0,0,1,0,0,0,1,0,0,0,1, ldraw_lib__4_4edge()],
// 1 16 0 1 0 1 0 0 0 1 0 0 0 1 4-4edge.dat
  [1,16,0,1,0,1,0,0,0,1,0,0,0,1, ldraw_lib__4_4edge()],
// 1 16 0 0 0 1 0 0 0 1 0 0 0 1 4-4cyli.dat
  [1,16,0,0,0,1,0,0,0,1,0,0,0,1, ldraw_lib__4_4cyli()],
// 0
];
module ldraw_lib__4_4cylo(step=0, col=false, unit=2/5, alt=false, line=0.2, solid=!$preview)
    makepoly(ldraw_lib__4_4cylo(), step=step, col=col, unit=unit, alt=alt, line=line, solid=solid);
ldraw_lib__4_4cylo(line=0.2);
// file: ../p/recte4.scad
use <../lib.scad>
function ldraw_lib__recte4() = [
// 0 Rectangle Empty with 4 Edges
// 0 Name: recte4.dat
// 0 Author: Steffen [Steffen]
// 0 !LDRAW_ORG Primitive UPDATE 2010-03
// 0 !LICENSE Licensed under CC BY 4.0 : see CAreadme.txt
// 
// 0 BFC CERTIFY CCW
  [0,"BFC","CERTIFY"],
  [0,"BFC","CCW"],
// 
// 0 !HISTORY 2010-12-31 [PTadmin] Official Update 2010-03
// 
// 
// 2 24 1 0 1 -1 0 1
  [2,24,1,0,1,-1,0,1],
// 2 24 -1 0 1 -1 0 -1
  [2,24,-1,0,1,-1,0,-1],
// 2 24 -1 0 -1 1 0 -1
  [2,24,-1,0,-1,1,0,-1],
// 2 24 1 0 -1 1 0 1
  [2,24,1,0,-1,1,0,1],
];
module ldraw_lib__recte4(step=0, col=false, unit=2/5, alt=false, line=0.2, solid=!$preview)
    makepoly(ldraw_lib__recte4(), step=step, col=col, unit=unit, alt=alt, line=line, solid=solid);
ldraw_lib__recte4(line=0.2);
// main file
use <../lib.scad>
use <../p/recte4.scad>
use <s/3982s01.scad>
function ldraw_lib__3982() = [
// 0 Duplo Wagon Body  4 x  6 with Sloped Sides
// 0 Name: 3982.dat
// 0 Author: Niels Karsdorp [nielsk]
// 0 !LDRAW_ORG Part UPDATE 2026-07
// 0 !LICENSE Licensed under CC BY 4.0 : see CAreadme.txt
// 
// 0 BFC CERTIFY CCW
  [0,"BFC","CERTIFY"],
  [0,"BFC","CCW"],
// 
// 0 !CATEGORY Vehicle
// 0 !KEYWORDS Brickowl 724433
// 
// 0 !HISTORY 2026-03-27 [Blechtaler] subfiled in half
// 0 !HISTORY 2026-07-30 [OrionP] Official Update 2026-07
// 
// 1 16 0 0 0 1 0 0 0 1 0 0 0 1 s\3982s01.dat
  [1,16,0,0,0,1,0,0,0,1,0,0,0,1, ldraw_lib__s__3982s01()],
// 1 16 0 0 0 -1 0 0 0 1 0 0 0 -1 s\3982s01.dat
  [1,16,0,0,0,-1,0,0,0,1,0,0,0,-1, ldraw_lib__s__3982s01()],
// 1 16 0 0 0 44 0 0 0 1 0 0 0 125 recte4.dat
  [1,16,0,0,0,44,0,0,0,1,0,0,0,125, ldraw_lib__recte4()],
// 1 16 0 -4 0 40 0 0 0 1 0 0 0 120 recte4.dat
  [1,16,0,-4,0,40,0,0,0,1,0,0,0,120, ldraw_lib__recte4()],
// 1 16 0 -48 0 54 0 0 0 1 0 0 0 120 recte4.dat
  [1,16,0,-48,0,54,0,0,0,1,0,0,0,120, ldraw_lib__recte4()],
// 1 16 0 -48 0 64 0 0 0 1 0 0 0 128 recte4.dat
  [1,16,0,-48,0,64,0,0,0,1,0,0,0,128, ldraw_lib__recte4()],
// 1 16 0 -40 0 61.455 0 0 0 1 0 0 0 128 recte4.dat
  [1,16,0,-40,0,61.455,0,0,0,1,0,0,0,128, ldraw_lib__recte4()],
// 1 16 0 -40 0 56.727 0 0 0 1 0 0 0 125 recte4.dat
  [1,16,0,-40,0,56.727,0,0,0,1,0,0,0,125, ldraw_lib__recte4()],
];
module ldraw_lib__3982(step=0, col=false, unit=2/5, alt=false, line=0.2, solid=!$preview)
    makepoly(ldraw_lib__3982(), step=step, col=col, unit=unit, alt=alt, line=line, solid=solid);
ldraw_lib__3982(line=0.2);
